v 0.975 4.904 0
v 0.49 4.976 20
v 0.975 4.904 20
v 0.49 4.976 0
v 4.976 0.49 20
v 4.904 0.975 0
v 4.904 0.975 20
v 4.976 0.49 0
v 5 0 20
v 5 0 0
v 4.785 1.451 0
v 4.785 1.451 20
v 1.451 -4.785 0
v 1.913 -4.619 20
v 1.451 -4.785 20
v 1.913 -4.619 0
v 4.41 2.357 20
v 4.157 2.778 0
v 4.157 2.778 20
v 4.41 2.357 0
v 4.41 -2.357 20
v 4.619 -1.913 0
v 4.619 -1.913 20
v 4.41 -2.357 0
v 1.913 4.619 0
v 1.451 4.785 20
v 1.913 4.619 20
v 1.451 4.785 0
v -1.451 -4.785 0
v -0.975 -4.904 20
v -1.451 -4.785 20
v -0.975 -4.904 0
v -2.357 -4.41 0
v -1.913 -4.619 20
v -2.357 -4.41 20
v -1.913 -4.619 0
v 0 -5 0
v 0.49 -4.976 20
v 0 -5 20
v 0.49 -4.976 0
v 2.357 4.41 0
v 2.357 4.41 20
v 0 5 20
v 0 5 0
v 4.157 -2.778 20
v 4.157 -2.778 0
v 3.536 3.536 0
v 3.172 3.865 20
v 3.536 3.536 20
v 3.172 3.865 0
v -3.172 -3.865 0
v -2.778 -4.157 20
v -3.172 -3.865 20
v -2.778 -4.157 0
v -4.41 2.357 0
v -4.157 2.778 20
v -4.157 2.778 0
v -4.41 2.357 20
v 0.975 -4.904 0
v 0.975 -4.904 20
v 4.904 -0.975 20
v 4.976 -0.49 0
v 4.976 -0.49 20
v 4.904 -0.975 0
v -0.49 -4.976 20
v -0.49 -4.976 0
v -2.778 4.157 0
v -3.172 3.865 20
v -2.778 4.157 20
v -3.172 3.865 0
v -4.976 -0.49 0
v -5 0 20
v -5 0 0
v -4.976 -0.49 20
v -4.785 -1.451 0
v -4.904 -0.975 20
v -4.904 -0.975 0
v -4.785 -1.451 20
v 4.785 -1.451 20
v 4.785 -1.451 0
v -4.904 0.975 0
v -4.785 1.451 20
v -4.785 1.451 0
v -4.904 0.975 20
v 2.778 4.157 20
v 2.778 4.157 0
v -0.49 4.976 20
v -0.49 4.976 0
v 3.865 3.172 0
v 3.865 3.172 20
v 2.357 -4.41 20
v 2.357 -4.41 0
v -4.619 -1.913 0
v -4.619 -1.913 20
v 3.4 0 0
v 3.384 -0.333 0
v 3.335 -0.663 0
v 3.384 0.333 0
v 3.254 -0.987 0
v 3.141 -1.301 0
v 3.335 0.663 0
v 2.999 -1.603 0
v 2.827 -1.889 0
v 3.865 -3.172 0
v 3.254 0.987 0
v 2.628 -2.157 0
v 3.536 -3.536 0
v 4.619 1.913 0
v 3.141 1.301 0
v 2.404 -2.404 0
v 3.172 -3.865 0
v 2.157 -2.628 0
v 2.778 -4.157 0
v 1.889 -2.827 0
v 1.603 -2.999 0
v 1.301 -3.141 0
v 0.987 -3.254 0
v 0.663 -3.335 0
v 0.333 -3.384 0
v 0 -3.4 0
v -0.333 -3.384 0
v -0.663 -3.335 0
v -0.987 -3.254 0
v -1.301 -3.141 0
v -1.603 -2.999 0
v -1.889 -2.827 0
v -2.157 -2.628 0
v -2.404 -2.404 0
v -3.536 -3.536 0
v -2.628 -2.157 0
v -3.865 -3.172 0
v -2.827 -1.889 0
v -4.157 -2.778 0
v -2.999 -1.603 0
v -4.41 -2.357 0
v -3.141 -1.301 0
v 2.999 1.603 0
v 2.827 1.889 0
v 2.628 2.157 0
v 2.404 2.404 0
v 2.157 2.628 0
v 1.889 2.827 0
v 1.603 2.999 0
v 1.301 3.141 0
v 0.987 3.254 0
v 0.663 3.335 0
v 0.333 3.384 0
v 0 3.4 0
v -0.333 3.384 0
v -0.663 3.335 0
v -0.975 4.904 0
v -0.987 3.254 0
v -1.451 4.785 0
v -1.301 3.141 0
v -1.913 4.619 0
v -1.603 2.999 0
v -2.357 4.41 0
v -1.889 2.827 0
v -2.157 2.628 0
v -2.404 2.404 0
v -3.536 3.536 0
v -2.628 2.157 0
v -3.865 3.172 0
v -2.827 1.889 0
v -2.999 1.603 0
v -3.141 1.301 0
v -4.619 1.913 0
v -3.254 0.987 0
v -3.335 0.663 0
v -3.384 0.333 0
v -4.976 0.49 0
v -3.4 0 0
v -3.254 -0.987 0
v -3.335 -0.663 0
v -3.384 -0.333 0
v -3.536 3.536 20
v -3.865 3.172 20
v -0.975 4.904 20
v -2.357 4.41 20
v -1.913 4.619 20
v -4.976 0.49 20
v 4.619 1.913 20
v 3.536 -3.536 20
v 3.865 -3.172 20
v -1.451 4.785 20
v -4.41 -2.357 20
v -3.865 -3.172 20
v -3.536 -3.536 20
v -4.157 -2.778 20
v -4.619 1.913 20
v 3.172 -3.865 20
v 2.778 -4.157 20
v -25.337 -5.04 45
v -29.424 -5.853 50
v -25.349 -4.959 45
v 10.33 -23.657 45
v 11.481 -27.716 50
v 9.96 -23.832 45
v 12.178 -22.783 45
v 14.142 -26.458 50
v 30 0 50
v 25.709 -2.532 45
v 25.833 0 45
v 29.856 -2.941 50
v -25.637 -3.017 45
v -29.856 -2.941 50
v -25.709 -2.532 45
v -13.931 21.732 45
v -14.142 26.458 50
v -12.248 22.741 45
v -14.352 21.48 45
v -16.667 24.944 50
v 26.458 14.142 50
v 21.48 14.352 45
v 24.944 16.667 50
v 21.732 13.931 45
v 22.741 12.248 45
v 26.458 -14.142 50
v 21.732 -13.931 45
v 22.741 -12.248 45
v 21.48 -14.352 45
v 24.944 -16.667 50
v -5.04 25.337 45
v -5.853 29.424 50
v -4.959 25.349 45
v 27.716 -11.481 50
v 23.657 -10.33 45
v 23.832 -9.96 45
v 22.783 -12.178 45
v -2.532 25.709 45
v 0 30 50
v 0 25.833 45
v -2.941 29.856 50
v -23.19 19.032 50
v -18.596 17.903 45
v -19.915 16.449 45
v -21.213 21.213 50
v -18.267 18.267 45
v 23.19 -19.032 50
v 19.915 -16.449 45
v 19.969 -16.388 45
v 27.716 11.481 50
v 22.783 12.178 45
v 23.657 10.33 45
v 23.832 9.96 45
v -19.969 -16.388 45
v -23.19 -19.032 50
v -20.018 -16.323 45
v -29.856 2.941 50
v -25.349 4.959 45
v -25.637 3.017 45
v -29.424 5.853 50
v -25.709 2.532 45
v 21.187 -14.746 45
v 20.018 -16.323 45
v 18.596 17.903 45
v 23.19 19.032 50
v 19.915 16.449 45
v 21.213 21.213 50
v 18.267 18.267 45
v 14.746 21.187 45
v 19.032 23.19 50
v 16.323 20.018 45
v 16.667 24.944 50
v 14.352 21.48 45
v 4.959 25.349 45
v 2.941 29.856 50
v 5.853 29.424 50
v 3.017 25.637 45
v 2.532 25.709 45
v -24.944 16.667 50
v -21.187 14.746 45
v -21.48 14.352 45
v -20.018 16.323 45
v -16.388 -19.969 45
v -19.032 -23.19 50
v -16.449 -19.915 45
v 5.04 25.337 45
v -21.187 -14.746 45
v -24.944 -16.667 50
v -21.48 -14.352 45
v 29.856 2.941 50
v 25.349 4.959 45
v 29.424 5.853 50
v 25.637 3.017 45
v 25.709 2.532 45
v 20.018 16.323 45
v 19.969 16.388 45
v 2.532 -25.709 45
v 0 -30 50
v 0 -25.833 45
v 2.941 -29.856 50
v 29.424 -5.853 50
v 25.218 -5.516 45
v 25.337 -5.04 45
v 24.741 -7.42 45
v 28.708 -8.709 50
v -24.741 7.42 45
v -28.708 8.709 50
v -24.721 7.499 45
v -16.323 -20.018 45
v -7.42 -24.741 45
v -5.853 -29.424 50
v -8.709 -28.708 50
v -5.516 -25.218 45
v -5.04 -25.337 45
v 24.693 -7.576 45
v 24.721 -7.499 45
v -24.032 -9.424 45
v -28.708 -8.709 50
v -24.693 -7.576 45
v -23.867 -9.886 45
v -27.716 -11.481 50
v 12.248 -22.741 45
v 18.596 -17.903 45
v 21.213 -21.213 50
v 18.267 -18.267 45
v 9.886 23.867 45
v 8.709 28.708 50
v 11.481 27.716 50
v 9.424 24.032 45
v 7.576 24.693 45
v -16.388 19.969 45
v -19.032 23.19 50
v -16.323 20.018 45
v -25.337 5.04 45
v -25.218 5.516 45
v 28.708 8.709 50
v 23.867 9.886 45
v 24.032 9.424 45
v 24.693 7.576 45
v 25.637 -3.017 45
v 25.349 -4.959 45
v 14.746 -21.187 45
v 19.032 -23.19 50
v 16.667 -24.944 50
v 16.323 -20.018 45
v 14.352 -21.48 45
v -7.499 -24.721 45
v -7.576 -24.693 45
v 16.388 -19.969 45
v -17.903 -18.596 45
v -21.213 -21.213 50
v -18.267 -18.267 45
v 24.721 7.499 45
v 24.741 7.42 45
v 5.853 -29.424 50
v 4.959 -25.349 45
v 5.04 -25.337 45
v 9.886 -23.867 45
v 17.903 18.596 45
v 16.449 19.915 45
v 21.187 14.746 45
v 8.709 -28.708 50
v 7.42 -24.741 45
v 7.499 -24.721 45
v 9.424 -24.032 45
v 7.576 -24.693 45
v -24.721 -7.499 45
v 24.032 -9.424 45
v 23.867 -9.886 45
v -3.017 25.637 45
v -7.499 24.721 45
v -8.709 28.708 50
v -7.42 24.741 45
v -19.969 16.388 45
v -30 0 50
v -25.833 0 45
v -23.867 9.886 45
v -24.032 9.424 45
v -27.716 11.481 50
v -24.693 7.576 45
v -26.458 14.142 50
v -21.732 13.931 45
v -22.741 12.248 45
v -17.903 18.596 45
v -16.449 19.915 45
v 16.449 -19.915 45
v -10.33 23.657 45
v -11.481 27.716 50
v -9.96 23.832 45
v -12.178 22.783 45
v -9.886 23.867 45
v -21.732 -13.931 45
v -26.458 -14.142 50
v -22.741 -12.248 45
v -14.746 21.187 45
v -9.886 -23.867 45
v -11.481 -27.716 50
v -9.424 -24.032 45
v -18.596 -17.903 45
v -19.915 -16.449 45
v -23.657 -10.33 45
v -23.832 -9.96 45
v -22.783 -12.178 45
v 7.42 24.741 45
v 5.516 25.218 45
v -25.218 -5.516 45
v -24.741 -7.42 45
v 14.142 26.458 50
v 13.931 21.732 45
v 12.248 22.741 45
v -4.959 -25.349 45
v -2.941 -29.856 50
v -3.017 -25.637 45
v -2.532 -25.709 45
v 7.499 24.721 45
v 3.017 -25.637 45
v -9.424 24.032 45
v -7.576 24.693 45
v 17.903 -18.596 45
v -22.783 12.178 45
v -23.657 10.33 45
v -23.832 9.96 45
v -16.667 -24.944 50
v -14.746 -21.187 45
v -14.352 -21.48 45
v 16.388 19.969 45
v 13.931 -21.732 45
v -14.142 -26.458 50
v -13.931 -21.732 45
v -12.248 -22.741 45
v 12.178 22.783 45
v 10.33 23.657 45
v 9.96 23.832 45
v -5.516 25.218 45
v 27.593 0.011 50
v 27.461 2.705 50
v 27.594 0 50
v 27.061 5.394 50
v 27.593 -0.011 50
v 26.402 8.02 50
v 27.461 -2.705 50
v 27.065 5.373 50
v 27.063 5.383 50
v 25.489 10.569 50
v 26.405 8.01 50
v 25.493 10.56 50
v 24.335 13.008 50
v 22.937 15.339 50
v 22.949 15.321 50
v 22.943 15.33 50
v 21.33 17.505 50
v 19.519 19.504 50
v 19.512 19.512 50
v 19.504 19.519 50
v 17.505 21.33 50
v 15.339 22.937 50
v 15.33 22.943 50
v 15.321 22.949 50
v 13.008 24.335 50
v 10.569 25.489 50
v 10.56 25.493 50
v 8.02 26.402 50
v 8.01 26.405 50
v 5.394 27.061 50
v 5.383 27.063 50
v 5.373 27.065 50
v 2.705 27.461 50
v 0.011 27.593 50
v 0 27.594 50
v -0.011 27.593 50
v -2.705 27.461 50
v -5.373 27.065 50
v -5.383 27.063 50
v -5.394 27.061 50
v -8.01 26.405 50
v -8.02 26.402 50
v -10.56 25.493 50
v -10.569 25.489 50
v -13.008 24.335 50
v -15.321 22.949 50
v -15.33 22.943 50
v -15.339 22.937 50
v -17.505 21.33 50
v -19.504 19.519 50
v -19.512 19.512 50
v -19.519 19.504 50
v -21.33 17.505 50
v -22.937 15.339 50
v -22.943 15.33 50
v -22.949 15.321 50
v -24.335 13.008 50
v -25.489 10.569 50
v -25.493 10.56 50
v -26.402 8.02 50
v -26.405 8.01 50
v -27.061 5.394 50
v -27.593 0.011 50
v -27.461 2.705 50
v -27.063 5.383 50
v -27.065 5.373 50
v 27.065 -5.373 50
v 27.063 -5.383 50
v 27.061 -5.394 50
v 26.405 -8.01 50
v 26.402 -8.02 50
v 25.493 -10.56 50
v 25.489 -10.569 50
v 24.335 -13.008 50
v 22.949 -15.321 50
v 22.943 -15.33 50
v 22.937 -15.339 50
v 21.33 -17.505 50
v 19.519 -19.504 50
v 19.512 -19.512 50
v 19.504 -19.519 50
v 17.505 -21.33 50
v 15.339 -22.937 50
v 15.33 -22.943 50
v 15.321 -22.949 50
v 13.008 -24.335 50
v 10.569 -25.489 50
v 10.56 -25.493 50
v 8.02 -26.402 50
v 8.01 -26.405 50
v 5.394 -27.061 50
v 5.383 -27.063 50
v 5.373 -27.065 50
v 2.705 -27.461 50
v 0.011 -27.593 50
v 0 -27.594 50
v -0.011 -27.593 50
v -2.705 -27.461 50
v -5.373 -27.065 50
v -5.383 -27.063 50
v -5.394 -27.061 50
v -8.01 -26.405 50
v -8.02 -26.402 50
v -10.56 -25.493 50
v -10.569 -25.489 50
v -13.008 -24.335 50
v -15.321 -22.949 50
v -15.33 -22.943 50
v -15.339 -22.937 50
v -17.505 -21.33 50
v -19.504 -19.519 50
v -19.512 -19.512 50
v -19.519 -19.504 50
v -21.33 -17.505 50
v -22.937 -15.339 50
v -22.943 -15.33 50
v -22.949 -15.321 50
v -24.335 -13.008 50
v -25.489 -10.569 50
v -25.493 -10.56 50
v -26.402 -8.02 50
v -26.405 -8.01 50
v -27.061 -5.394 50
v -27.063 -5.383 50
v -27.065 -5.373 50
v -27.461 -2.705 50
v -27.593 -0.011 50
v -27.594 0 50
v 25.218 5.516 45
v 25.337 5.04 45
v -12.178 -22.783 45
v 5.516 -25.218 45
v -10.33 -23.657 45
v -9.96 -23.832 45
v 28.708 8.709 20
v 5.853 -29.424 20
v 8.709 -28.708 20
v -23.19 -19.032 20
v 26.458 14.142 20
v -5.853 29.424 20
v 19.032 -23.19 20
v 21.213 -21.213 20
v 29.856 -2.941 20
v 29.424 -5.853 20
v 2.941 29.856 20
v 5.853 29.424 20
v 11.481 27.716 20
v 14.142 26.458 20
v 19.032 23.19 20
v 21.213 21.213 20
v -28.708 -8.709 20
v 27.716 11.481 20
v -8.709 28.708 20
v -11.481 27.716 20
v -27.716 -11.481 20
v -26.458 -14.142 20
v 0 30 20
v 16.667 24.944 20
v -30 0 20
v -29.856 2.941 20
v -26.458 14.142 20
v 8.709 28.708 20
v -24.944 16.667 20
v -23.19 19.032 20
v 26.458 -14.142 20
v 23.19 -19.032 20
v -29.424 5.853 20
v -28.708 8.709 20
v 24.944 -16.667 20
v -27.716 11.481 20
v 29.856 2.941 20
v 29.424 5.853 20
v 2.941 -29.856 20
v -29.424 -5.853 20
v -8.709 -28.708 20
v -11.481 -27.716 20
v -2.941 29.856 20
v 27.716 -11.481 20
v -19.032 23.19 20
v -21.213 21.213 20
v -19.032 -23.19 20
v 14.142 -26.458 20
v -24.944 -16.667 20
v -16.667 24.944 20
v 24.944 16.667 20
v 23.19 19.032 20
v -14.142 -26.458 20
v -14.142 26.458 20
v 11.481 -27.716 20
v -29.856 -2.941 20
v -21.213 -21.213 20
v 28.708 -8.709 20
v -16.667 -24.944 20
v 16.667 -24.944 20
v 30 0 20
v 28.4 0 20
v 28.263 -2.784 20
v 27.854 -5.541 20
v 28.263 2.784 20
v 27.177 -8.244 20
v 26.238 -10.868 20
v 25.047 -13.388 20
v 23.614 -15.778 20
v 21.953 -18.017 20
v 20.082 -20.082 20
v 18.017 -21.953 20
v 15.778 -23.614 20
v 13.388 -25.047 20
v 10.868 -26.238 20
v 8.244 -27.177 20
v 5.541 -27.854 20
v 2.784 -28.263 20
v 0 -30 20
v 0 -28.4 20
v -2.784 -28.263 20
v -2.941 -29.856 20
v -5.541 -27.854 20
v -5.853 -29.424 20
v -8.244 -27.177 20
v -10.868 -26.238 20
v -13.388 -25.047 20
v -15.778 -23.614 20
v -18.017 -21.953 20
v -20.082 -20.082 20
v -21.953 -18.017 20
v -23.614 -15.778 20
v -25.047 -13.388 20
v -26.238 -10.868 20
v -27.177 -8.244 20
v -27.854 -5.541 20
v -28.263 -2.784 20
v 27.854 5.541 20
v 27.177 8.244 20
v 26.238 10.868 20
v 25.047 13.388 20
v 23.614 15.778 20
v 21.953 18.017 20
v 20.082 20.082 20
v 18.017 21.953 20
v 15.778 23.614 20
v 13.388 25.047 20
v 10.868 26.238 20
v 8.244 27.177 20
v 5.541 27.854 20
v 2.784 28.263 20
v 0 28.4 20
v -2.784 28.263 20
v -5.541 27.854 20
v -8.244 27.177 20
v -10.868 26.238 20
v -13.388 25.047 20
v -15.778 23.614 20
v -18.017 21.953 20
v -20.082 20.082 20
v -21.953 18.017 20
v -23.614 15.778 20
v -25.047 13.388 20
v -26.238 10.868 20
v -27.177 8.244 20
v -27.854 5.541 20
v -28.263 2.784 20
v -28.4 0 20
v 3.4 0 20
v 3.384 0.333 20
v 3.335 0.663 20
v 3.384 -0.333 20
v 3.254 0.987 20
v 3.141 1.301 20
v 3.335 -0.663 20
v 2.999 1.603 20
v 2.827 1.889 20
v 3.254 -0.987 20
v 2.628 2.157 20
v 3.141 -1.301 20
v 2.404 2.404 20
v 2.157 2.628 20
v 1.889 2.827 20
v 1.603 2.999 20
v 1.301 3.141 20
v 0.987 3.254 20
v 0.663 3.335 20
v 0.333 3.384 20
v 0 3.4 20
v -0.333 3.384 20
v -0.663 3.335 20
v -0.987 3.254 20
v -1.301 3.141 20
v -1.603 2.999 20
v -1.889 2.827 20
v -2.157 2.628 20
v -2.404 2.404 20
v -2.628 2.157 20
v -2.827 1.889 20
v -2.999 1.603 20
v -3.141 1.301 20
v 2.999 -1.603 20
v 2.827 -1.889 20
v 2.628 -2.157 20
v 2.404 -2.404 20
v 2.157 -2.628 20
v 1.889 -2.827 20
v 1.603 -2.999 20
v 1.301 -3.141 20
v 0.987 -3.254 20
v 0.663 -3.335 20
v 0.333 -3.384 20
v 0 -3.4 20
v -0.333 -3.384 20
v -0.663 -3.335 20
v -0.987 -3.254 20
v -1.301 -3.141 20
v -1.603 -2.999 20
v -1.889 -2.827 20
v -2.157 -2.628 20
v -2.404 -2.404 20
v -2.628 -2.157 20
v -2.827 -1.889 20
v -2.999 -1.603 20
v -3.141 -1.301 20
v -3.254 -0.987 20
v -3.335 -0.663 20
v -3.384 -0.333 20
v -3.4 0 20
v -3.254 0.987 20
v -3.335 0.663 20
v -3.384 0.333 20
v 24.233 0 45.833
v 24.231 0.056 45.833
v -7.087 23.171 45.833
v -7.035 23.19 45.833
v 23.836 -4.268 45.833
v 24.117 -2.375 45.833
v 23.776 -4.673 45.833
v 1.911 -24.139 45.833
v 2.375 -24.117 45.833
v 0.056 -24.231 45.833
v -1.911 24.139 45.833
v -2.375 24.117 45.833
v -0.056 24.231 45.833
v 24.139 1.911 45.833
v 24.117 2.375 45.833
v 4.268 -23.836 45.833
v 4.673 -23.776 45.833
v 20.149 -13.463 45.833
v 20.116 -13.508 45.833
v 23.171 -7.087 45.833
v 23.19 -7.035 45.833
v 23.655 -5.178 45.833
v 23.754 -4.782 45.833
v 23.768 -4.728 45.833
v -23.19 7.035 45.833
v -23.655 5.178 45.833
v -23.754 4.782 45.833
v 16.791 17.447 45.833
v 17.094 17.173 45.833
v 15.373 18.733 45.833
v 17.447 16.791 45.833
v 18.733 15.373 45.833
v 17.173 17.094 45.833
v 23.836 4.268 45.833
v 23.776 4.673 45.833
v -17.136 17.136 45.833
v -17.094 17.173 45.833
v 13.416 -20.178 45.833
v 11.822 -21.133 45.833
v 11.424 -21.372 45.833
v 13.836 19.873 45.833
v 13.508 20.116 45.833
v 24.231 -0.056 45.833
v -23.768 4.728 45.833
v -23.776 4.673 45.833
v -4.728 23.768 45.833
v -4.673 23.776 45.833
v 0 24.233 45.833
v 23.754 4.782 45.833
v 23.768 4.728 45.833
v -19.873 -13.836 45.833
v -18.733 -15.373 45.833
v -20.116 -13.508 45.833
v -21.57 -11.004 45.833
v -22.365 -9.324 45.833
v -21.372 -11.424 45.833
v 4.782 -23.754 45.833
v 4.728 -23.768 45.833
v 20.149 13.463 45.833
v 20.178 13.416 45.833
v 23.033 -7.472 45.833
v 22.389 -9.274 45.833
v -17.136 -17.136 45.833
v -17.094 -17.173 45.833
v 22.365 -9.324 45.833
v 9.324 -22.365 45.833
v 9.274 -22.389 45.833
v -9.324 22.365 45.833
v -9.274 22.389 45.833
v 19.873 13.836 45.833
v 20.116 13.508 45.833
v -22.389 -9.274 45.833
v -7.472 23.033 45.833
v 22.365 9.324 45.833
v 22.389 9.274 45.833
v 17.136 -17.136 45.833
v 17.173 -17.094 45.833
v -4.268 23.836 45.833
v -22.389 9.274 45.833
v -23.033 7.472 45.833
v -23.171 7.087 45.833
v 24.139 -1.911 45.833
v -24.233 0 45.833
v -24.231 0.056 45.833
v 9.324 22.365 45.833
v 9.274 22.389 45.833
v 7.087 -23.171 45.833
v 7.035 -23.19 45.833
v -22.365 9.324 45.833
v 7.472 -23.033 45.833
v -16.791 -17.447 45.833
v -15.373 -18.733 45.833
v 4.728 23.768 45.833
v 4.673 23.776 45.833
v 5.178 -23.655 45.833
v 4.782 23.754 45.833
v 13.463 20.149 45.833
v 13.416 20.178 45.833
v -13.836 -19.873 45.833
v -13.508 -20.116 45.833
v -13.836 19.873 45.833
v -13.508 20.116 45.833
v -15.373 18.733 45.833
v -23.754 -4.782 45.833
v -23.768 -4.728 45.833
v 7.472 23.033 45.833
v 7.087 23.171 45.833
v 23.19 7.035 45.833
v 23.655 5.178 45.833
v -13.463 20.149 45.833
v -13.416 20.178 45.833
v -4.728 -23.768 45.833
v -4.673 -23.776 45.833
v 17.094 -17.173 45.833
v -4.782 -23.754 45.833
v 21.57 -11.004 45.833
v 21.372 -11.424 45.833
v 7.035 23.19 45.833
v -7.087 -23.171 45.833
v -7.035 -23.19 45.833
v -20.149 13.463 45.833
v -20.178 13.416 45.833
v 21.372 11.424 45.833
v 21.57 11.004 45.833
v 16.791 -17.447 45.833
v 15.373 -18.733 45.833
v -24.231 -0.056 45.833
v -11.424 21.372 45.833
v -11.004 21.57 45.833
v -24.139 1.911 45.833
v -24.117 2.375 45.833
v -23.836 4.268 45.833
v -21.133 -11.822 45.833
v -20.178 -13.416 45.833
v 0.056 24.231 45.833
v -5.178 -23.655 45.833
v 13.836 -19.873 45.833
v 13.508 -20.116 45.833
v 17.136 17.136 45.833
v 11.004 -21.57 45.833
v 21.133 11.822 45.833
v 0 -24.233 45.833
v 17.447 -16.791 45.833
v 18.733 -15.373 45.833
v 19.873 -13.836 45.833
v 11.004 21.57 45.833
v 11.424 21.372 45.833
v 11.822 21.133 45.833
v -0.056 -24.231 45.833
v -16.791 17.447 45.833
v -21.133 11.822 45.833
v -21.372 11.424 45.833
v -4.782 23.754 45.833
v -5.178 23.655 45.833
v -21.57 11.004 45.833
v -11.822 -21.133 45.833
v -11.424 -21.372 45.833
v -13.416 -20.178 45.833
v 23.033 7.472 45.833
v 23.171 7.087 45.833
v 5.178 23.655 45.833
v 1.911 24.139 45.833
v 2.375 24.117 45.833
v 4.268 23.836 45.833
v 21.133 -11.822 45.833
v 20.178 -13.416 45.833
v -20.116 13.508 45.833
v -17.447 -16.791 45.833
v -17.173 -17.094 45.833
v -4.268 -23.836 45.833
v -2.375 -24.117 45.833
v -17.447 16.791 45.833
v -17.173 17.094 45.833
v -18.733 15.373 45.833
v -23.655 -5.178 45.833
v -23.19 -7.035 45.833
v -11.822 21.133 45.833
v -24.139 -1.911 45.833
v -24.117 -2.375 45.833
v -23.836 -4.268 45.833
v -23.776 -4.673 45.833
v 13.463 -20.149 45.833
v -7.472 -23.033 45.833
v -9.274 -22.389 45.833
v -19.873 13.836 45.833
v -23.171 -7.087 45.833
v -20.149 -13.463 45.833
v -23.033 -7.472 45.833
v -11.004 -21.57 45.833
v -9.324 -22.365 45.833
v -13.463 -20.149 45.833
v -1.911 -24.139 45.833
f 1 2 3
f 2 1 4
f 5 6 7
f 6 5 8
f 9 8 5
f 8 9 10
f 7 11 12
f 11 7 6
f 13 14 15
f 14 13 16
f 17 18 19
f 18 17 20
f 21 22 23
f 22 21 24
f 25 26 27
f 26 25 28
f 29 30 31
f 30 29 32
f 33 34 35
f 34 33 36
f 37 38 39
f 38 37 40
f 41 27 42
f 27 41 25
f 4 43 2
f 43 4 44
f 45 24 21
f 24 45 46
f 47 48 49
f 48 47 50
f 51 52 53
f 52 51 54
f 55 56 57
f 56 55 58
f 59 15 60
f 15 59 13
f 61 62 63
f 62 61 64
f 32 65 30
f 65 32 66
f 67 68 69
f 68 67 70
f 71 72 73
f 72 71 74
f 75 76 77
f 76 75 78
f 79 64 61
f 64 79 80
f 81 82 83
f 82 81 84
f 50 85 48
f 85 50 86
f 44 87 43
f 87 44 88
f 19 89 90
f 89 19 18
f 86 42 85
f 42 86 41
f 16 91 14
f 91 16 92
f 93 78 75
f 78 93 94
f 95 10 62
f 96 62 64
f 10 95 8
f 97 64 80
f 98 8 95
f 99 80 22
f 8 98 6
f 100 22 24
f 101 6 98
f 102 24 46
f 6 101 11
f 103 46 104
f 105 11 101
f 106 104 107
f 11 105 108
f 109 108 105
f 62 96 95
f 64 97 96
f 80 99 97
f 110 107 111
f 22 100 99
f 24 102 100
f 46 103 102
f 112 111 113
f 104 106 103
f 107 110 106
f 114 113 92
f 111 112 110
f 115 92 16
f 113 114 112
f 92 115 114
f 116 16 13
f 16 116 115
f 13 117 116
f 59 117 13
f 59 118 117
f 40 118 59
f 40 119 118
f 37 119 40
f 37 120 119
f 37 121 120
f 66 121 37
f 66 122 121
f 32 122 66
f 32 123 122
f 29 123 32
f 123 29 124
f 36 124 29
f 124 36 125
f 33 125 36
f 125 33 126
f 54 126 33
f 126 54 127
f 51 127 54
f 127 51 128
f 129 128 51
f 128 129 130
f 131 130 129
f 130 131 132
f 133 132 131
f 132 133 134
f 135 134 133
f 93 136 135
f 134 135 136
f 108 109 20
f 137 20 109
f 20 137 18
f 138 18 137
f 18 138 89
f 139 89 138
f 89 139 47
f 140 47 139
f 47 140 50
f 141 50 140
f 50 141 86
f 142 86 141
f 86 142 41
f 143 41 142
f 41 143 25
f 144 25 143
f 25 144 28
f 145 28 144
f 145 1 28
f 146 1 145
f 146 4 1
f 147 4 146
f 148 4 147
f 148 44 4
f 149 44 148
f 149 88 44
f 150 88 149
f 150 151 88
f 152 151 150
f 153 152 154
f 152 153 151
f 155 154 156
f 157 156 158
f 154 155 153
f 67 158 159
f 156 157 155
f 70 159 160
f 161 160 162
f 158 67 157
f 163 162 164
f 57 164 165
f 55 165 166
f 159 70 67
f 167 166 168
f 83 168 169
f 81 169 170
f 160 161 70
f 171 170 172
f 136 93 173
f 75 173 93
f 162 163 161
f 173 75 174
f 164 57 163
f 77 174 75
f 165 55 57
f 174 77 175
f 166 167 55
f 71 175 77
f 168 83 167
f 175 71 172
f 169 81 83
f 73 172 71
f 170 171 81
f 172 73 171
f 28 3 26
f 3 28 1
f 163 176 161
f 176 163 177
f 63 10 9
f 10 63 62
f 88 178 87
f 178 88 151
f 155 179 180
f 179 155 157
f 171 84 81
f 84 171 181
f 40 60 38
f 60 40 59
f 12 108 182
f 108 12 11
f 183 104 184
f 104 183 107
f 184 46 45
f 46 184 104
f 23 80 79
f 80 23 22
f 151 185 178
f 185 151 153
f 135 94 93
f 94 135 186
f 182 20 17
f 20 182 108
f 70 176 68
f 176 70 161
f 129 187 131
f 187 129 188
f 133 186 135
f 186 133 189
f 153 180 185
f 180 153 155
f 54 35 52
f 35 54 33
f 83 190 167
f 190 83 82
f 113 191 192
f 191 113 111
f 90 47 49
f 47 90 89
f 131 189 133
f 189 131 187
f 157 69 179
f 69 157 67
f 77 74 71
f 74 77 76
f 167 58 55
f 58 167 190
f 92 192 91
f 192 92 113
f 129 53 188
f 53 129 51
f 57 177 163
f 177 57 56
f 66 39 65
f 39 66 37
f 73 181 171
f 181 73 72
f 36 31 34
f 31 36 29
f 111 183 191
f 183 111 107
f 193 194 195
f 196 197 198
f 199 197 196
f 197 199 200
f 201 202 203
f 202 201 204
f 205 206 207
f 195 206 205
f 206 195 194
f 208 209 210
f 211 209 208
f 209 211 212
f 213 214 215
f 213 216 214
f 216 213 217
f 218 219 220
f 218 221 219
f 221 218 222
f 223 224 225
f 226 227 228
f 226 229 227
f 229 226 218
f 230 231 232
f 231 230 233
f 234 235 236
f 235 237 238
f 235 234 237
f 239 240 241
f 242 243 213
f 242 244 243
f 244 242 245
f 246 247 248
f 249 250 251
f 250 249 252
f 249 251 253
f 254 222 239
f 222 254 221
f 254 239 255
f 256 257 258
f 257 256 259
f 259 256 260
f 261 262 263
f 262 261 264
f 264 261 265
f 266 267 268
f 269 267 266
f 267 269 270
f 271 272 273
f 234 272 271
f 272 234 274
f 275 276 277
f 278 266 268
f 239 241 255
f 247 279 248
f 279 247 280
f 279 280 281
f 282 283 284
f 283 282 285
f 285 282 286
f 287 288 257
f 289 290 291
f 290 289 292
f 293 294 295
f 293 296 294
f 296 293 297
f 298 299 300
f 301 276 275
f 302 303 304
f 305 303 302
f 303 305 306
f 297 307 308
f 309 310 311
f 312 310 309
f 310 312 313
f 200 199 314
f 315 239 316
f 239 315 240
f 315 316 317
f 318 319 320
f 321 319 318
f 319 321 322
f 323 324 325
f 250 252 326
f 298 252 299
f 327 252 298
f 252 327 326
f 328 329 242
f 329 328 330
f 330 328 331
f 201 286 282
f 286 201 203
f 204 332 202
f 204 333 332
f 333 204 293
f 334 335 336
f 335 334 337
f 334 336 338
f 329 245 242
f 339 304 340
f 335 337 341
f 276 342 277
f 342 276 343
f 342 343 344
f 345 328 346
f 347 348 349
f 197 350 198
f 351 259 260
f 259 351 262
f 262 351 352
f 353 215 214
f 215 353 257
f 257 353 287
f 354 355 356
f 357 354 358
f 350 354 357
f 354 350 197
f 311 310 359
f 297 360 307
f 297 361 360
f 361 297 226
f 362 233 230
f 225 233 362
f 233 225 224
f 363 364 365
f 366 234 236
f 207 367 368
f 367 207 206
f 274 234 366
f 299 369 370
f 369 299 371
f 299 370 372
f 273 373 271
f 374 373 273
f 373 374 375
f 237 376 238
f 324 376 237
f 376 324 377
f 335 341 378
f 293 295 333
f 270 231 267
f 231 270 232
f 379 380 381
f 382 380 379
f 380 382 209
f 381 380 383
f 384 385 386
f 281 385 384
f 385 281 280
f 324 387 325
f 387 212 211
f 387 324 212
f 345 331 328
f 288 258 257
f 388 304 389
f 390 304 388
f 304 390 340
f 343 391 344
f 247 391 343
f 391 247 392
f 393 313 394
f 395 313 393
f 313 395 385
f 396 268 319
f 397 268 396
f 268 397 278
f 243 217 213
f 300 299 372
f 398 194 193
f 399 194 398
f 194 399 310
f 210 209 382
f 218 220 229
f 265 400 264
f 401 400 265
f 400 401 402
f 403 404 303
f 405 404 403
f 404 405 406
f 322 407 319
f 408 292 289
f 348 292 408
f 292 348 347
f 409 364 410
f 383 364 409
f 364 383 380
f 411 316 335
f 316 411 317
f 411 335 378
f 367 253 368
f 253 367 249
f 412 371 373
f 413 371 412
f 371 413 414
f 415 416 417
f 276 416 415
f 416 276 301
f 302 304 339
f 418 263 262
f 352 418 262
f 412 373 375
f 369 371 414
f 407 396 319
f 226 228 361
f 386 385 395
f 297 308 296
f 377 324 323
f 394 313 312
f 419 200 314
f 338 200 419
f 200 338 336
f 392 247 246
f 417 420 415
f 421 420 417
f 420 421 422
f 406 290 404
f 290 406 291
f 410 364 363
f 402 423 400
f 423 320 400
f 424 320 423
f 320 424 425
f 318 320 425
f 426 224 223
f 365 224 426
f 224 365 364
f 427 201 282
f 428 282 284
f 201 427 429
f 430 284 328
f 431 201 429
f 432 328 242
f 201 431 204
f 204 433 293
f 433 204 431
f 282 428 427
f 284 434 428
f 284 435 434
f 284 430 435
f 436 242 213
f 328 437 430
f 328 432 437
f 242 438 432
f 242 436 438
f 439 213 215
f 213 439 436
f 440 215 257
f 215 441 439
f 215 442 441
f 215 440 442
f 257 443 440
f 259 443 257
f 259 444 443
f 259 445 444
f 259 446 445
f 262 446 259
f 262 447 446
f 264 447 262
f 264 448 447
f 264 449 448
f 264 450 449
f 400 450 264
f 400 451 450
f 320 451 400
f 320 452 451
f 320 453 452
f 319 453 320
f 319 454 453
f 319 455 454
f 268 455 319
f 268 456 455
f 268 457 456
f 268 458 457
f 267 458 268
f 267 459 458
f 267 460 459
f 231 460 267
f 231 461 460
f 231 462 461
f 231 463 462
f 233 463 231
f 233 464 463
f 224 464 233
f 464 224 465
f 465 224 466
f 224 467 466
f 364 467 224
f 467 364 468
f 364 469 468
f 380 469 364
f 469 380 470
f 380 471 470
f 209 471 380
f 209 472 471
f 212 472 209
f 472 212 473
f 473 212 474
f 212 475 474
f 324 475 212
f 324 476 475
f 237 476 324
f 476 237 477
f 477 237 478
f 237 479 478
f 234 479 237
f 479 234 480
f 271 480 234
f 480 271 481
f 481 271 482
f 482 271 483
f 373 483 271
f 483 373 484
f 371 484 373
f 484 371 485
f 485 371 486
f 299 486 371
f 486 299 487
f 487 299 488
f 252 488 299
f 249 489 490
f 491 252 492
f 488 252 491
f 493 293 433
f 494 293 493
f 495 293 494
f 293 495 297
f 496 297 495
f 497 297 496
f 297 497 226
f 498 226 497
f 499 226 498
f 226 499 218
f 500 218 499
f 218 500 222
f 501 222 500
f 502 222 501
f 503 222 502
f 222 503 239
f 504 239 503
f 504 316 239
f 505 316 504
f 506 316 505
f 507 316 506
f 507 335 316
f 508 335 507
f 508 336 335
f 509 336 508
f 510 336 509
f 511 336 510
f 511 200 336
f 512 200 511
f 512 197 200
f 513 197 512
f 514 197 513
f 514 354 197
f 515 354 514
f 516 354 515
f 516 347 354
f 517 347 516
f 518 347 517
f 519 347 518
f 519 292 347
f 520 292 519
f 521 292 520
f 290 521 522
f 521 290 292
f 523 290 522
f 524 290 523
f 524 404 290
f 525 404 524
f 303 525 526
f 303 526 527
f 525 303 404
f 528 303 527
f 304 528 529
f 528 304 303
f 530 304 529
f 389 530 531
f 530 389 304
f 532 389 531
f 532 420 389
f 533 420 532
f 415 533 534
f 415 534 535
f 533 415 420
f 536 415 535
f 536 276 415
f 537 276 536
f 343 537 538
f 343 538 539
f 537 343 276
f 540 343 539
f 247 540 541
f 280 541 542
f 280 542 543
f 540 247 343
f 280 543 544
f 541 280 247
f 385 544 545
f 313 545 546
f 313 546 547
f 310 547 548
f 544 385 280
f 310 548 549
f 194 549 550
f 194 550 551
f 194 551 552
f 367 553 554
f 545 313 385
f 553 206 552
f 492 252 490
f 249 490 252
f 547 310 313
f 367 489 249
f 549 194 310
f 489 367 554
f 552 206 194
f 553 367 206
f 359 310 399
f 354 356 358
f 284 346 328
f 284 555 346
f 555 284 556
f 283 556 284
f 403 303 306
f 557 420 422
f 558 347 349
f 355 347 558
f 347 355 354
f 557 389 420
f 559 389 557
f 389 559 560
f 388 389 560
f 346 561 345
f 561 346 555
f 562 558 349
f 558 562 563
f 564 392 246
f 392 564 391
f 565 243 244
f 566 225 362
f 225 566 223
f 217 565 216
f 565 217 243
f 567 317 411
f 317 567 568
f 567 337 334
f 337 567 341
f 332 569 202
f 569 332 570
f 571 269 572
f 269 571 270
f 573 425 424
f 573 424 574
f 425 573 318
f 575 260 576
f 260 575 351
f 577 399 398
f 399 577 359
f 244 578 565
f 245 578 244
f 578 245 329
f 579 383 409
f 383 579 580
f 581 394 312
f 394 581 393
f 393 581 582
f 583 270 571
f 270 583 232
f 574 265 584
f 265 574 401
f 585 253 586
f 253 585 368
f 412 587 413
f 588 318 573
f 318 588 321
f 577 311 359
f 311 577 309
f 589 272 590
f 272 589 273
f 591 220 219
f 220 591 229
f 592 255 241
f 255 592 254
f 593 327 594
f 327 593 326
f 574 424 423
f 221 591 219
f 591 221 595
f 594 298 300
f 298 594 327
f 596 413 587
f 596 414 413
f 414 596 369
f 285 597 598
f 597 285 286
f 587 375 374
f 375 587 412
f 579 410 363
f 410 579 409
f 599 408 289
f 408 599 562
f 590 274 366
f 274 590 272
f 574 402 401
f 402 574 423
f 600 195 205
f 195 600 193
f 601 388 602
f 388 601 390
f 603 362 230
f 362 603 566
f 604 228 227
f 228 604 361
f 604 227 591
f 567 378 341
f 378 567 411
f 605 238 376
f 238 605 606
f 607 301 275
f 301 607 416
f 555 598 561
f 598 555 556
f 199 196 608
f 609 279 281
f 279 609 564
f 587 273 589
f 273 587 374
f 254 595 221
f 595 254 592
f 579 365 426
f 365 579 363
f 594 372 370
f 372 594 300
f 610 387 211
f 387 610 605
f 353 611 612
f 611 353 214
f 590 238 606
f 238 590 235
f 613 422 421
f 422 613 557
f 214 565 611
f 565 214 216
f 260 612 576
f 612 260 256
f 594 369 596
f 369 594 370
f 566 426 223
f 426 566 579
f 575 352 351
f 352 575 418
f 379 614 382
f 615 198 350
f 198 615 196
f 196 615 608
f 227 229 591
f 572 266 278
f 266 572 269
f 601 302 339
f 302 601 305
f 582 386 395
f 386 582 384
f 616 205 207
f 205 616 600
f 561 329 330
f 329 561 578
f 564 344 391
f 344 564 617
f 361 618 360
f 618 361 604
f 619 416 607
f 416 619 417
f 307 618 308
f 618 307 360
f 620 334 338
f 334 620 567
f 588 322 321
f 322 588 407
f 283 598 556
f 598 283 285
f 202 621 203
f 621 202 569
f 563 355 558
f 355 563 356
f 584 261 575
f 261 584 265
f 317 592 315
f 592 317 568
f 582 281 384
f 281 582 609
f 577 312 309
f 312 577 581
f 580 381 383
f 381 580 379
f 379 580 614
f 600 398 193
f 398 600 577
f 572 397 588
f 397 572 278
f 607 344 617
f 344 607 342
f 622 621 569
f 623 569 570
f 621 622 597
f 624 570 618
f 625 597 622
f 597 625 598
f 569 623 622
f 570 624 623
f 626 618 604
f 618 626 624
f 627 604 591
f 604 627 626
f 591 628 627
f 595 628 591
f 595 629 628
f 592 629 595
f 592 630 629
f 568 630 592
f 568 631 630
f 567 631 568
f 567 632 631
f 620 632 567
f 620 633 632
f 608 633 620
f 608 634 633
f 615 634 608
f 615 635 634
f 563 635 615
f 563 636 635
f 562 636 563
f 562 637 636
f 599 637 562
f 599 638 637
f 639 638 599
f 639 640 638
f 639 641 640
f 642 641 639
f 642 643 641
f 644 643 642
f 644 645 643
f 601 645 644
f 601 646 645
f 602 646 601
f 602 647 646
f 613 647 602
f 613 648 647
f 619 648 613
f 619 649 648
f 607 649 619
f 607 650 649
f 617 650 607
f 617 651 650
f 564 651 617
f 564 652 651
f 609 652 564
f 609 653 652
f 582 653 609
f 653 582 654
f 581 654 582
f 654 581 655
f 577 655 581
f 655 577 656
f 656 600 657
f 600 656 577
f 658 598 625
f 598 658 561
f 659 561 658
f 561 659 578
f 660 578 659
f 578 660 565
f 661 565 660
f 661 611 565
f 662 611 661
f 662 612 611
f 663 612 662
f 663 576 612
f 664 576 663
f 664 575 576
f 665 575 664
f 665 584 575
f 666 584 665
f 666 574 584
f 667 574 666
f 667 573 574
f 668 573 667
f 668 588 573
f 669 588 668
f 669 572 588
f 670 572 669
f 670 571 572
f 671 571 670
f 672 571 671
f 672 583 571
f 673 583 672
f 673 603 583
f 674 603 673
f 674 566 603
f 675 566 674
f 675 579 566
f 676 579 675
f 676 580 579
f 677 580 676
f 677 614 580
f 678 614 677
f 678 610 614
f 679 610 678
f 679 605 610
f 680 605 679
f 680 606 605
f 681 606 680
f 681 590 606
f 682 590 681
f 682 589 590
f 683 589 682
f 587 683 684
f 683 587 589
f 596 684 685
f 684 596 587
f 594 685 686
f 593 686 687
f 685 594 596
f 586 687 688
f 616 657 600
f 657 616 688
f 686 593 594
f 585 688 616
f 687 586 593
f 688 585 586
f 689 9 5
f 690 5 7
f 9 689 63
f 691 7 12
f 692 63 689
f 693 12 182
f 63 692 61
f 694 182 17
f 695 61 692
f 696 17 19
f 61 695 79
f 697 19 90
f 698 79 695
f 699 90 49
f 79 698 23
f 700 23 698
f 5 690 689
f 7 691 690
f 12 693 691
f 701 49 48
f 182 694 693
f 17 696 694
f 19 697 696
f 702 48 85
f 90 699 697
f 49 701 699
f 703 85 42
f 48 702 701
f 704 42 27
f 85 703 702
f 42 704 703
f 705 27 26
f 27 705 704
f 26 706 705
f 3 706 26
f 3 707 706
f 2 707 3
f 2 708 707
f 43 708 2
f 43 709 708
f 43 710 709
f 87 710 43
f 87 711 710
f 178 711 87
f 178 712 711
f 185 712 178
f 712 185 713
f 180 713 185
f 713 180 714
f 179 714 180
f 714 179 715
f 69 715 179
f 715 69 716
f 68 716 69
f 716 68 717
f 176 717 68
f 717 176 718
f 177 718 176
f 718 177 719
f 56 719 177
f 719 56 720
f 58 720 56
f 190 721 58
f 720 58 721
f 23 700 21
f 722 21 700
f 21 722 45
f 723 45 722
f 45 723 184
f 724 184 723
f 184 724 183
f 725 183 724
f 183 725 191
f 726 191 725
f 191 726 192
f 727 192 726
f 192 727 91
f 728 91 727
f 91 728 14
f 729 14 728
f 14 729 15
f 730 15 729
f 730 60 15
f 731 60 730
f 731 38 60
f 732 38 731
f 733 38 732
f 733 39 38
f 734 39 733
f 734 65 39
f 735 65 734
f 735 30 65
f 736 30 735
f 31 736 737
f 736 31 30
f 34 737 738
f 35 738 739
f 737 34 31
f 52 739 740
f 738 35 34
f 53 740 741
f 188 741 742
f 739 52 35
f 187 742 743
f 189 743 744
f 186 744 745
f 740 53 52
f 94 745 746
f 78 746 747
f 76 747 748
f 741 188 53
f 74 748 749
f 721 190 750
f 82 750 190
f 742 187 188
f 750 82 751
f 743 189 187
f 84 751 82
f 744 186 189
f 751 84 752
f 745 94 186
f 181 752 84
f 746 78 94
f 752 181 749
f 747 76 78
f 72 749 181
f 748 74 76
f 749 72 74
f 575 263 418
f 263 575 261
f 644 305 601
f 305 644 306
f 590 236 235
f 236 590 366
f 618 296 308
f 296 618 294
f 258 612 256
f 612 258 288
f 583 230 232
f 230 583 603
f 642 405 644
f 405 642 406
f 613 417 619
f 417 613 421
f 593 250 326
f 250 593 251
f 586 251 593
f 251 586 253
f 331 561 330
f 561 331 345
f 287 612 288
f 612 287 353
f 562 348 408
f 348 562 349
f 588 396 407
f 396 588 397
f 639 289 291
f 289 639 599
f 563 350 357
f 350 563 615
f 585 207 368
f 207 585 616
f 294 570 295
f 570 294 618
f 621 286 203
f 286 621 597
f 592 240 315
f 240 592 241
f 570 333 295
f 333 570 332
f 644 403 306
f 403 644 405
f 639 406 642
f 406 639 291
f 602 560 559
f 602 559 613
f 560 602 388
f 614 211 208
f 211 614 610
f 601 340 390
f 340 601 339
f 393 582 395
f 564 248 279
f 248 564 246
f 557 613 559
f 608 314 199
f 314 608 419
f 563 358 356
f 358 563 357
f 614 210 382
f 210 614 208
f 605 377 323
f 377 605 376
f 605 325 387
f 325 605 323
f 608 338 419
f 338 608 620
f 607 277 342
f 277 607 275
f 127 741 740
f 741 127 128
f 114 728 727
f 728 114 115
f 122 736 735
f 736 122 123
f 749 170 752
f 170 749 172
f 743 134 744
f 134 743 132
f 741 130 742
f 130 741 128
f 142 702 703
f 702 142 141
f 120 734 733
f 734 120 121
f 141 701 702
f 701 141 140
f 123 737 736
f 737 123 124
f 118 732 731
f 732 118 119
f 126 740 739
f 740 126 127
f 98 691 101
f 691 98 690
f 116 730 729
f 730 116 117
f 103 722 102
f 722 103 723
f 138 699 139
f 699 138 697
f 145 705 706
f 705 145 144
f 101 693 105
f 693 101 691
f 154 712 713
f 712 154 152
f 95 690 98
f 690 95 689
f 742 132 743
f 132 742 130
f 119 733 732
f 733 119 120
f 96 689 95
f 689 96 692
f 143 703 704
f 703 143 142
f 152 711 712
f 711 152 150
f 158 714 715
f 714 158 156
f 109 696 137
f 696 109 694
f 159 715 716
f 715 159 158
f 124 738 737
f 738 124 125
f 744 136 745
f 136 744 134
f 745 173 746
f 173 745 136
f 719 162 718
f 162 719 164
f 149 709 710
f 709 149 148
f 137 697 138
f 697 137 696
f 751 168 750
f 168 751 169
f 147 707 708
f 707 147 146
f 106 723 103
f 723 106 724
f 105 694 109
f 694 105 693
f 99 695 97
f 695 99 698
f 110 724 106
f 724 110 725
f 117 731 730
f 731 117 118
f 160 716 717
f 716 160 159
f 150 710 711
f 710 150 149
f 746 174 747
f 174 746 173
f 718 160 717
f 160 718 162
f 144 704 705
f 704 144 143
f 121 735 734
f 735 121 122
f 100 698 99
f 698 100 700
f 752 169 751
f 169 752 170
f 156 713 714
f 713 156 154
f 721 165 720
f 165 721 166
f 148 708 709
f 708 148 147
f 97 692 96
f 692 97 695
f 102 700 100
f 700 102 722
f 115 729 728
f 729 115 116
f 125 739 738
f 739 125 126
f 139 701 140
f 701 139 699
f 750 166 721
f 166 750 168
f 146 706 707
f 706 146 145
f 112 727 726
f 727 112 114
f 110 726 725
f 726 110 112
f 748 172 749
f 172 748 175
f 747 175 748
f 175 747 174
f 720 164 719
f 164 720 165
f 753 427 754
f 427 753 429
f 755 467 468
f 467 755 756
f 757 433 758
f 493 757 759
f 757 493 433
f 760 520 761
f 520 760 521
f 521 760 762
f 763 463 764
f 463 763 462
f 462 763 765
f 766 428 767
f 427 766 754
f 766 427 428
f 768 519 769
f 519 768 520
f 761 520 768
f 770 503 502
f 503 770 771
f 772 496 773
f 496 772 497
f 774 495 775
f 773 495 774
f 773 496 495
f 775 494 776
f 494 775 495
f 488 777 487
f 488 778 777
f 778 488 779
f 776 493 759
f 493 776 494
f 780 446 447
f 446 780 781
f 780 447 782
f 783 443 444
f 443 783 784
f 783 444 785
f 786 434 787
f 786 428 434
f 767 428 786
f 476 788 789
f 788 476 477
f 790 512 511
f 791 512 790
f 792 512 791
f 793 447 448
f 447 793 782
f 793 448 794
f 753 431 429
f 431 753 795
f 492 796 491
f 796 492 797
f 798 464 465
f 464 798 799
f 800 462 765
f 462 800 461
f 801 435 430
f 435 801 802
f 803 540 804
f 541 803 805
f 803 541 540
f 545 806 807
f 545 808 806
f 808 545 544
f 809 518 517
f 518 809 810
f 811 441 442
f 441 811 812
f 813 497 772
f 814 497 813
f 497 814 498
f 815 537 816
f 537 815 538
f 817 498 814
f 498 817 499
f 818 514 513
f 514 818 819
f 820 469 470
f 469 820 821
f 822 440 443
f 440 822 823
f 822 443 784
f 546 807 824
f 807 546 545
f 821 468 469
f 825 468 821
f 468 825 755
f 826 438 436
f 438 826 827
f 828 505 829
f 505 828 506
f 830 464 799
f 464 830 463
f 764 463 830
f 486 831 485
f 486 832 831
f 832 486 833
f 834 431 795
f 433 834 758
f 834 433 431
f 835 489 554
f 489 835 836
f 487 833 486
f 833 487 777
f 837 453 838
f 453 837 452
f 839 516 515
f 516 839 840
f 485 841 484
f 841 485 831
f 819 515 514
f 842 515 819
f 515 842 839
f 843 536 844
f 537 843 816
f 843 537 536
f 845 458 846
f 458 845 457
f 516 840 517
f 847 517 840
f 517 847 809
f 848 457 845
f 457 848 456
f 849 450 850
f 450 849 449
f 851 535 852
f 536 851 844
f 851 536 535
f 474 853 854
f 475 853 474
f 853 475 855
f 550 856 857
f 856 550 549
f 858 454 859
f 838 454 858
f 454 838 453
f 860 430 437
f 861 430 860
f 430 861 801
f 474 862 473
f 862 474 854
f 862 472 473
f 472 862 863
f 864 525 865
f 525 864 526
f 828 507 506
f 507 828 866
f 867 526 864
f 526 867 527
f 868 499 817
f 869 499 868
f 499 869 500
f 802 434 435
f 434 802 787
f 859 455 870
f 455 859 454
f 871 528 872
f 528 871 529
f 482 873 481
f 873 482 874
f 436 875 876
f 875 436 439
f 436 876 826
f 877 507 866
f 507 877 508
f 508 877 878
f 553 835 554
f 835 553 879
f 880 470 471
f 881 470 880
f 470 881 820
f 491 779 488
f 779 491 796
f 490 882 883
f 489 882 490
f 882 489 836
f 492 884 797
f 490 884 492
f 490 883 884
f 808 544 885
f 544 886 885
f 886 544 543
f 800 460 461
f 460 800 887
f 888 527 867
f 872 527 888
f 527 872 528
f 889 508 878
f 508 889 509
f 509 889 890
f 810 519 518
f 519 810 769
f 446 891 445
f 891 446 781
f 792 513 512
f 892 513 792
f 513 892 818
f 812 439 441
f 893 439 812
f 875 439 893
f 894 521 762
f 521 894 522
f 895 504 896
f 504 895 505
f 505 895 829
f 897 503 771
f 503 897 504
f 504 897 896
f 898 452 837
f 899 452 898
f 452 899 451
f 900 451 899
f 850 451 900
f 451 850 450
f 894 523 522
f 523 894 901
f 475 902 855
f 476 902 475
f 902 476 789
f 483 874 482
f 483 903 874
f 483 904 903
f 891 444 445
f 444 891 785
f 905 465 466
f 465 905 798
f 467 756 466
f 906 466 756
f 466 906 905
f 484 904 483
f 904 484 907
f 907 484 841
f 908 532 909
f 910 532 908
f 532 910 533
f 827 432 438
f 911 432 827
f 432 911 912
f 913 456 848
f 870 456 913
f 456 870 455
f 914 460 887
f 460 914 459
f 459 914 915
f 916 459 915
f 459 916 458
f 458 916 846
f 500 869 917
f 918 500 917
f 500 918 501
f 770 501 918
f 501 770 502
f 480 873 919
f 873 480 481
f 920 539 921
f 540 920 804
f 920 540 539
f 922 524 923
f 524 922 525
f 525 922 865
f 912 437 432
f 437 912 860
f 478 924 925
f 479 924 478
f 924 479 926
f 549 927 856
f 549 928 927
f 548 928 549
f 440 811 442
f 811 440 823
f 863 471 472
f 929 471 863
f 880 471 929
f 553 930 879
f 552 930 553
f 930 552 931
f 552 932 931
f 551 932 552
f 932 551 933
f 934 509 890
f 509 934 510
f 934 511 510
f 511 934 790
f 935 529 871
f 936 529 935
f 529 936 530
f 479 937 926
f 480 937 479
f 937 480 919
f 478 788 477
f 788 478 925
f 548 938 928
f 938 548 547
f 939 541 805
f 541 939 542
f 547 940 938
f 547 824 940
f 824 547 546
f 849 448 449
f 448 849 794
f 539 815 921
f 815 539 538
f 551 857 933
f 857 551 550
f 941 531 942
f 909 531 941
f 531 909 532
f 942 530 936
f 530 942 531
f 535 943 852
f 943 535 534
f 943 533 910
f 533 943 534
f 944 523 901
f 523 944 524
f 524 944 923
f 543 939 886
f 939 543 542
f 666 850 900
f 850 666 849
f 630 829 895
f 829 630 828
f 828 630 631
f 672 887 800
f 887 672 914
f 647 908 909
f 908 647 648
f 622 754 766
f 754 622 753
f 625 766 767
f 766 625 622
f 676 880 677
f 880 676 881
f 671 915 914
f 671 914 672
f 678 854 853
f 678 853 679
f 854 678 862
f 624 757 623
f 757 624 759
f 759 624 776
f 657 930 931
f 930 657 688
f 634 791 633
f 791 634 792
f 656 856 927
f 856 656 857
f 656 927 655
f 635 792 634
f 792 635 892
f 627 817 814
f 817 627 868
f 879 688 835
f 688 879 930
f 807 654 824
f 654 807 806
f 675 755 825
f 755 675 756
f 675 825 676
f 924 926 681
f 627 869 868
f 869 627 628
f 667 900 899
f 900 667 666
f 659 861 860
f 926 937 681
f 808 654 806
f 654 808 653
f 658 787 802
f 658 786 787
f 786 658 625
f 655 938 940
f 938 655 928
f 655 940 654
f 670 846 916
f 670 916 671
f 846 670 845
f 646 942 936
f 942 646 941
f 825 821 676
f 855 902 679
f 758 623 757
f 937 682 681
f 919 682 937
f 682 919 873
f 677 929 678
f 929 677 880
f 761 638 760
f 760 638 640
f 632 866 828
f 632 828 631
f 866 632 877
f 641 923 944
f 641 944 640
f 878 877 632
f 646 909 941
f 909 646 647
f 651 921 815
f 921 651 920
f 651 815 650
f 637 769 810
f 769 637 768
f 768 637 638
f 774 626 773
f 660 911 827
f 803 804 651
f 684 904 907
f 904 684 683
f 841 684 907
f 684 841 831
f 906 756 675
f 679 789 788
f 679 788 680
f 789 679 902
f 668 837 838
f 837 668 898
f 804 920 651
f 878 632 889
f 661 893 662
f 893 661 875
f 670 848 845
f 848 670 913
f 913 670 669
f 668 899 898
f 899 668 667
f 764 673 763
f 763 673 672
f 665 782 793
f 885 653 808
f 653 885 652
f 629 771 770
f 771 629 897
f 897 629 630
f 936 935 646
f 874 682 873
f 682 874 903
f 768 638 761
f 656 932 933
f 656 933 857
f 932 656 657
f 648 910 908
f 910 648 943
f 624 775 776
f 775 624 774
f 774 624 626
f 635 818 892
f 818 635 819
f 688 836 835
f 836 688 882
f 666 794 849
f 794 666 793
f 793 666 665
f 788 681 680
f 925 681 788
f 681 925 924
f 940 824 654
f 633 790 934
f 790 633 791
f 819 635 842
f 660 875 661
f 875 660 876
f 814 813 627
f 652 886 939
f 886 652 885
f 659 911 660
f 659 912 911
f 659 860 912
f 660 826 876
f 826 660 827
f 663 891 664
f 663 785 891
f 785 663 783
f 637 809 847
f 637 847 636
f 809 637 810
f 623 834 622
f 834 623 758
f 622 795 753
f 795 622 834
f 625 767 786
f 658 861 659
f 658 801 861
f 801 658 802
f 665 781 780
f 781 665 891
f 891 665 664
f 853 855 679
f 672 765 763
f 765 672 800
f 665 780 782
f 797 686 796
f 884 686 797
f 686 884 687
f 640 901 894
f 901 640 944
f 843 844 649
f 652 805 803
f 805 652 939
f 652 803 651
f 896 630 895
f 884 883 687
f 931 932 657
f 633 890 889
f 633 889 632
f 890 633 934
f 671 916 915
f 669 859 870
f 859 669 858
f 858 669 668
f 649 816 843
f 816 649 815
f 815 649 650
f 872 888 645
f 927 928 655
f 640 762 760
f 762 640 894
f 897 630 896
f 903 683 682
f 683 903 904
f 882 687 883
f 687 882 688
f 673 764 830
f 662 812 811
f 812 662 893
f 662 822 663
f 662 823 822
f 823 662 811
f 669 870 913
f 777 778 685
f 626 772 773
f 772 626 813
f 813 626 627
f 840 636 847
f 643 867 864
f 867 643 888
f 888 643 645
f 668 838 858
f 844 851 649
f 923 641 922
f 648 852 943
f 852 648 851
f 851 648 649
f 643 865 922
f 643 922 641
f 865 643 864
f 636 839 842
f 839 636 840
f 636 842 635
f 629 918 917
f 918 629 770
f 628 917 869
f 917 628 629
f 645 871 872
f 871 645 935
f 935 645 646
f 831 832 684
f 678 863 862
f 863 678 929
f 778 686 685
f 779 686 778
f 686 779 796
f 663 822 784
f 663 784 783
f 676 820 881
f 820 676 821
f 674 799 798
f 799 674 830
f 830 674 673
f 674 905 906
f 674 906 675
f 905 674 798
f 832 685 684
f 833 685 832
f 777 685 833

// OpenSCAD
// Funnel - a straight spout (tube) with a conical bowl, open at both ends, for pouring
// liquids in the lab. NOVEL general part.
//

spout_d = 10;
spout_l = 20;
cone_d  = 60;
rim     = 50;
wall    = 1.6;

$fn = 64;

ib = spout_d - 2 * wall;   // bore of the spout

difference() {
    union() {
        cylinder(h = spout_l, d = spout_d);          // spout
        translate([0, 0, spout_l]) cylinder(h = 30, d1 = spout_d, d2 = cone_d);  // cone (flares out)
        translate([0, 0, spout_l]) cylinder(h = 30, d1 = cone_d, d2 = rim);       // cone (flares in to the rim)
    }
    translate([0, 0, -1]) cylinder(h = spout_l + 2, d = ib);                     // bore through the spout
    translate([0, 0, spout_l]) cylinder(h = 31, d1 = ib, d2 = cone_d - 2 * wall);  // inner cone surface
    translate([0, 0, spout_l]) cylinder(h = 31, d1 = cone_d - 2 * wall, d2 = rim - 2 * wall);  // inner cone surface
}
